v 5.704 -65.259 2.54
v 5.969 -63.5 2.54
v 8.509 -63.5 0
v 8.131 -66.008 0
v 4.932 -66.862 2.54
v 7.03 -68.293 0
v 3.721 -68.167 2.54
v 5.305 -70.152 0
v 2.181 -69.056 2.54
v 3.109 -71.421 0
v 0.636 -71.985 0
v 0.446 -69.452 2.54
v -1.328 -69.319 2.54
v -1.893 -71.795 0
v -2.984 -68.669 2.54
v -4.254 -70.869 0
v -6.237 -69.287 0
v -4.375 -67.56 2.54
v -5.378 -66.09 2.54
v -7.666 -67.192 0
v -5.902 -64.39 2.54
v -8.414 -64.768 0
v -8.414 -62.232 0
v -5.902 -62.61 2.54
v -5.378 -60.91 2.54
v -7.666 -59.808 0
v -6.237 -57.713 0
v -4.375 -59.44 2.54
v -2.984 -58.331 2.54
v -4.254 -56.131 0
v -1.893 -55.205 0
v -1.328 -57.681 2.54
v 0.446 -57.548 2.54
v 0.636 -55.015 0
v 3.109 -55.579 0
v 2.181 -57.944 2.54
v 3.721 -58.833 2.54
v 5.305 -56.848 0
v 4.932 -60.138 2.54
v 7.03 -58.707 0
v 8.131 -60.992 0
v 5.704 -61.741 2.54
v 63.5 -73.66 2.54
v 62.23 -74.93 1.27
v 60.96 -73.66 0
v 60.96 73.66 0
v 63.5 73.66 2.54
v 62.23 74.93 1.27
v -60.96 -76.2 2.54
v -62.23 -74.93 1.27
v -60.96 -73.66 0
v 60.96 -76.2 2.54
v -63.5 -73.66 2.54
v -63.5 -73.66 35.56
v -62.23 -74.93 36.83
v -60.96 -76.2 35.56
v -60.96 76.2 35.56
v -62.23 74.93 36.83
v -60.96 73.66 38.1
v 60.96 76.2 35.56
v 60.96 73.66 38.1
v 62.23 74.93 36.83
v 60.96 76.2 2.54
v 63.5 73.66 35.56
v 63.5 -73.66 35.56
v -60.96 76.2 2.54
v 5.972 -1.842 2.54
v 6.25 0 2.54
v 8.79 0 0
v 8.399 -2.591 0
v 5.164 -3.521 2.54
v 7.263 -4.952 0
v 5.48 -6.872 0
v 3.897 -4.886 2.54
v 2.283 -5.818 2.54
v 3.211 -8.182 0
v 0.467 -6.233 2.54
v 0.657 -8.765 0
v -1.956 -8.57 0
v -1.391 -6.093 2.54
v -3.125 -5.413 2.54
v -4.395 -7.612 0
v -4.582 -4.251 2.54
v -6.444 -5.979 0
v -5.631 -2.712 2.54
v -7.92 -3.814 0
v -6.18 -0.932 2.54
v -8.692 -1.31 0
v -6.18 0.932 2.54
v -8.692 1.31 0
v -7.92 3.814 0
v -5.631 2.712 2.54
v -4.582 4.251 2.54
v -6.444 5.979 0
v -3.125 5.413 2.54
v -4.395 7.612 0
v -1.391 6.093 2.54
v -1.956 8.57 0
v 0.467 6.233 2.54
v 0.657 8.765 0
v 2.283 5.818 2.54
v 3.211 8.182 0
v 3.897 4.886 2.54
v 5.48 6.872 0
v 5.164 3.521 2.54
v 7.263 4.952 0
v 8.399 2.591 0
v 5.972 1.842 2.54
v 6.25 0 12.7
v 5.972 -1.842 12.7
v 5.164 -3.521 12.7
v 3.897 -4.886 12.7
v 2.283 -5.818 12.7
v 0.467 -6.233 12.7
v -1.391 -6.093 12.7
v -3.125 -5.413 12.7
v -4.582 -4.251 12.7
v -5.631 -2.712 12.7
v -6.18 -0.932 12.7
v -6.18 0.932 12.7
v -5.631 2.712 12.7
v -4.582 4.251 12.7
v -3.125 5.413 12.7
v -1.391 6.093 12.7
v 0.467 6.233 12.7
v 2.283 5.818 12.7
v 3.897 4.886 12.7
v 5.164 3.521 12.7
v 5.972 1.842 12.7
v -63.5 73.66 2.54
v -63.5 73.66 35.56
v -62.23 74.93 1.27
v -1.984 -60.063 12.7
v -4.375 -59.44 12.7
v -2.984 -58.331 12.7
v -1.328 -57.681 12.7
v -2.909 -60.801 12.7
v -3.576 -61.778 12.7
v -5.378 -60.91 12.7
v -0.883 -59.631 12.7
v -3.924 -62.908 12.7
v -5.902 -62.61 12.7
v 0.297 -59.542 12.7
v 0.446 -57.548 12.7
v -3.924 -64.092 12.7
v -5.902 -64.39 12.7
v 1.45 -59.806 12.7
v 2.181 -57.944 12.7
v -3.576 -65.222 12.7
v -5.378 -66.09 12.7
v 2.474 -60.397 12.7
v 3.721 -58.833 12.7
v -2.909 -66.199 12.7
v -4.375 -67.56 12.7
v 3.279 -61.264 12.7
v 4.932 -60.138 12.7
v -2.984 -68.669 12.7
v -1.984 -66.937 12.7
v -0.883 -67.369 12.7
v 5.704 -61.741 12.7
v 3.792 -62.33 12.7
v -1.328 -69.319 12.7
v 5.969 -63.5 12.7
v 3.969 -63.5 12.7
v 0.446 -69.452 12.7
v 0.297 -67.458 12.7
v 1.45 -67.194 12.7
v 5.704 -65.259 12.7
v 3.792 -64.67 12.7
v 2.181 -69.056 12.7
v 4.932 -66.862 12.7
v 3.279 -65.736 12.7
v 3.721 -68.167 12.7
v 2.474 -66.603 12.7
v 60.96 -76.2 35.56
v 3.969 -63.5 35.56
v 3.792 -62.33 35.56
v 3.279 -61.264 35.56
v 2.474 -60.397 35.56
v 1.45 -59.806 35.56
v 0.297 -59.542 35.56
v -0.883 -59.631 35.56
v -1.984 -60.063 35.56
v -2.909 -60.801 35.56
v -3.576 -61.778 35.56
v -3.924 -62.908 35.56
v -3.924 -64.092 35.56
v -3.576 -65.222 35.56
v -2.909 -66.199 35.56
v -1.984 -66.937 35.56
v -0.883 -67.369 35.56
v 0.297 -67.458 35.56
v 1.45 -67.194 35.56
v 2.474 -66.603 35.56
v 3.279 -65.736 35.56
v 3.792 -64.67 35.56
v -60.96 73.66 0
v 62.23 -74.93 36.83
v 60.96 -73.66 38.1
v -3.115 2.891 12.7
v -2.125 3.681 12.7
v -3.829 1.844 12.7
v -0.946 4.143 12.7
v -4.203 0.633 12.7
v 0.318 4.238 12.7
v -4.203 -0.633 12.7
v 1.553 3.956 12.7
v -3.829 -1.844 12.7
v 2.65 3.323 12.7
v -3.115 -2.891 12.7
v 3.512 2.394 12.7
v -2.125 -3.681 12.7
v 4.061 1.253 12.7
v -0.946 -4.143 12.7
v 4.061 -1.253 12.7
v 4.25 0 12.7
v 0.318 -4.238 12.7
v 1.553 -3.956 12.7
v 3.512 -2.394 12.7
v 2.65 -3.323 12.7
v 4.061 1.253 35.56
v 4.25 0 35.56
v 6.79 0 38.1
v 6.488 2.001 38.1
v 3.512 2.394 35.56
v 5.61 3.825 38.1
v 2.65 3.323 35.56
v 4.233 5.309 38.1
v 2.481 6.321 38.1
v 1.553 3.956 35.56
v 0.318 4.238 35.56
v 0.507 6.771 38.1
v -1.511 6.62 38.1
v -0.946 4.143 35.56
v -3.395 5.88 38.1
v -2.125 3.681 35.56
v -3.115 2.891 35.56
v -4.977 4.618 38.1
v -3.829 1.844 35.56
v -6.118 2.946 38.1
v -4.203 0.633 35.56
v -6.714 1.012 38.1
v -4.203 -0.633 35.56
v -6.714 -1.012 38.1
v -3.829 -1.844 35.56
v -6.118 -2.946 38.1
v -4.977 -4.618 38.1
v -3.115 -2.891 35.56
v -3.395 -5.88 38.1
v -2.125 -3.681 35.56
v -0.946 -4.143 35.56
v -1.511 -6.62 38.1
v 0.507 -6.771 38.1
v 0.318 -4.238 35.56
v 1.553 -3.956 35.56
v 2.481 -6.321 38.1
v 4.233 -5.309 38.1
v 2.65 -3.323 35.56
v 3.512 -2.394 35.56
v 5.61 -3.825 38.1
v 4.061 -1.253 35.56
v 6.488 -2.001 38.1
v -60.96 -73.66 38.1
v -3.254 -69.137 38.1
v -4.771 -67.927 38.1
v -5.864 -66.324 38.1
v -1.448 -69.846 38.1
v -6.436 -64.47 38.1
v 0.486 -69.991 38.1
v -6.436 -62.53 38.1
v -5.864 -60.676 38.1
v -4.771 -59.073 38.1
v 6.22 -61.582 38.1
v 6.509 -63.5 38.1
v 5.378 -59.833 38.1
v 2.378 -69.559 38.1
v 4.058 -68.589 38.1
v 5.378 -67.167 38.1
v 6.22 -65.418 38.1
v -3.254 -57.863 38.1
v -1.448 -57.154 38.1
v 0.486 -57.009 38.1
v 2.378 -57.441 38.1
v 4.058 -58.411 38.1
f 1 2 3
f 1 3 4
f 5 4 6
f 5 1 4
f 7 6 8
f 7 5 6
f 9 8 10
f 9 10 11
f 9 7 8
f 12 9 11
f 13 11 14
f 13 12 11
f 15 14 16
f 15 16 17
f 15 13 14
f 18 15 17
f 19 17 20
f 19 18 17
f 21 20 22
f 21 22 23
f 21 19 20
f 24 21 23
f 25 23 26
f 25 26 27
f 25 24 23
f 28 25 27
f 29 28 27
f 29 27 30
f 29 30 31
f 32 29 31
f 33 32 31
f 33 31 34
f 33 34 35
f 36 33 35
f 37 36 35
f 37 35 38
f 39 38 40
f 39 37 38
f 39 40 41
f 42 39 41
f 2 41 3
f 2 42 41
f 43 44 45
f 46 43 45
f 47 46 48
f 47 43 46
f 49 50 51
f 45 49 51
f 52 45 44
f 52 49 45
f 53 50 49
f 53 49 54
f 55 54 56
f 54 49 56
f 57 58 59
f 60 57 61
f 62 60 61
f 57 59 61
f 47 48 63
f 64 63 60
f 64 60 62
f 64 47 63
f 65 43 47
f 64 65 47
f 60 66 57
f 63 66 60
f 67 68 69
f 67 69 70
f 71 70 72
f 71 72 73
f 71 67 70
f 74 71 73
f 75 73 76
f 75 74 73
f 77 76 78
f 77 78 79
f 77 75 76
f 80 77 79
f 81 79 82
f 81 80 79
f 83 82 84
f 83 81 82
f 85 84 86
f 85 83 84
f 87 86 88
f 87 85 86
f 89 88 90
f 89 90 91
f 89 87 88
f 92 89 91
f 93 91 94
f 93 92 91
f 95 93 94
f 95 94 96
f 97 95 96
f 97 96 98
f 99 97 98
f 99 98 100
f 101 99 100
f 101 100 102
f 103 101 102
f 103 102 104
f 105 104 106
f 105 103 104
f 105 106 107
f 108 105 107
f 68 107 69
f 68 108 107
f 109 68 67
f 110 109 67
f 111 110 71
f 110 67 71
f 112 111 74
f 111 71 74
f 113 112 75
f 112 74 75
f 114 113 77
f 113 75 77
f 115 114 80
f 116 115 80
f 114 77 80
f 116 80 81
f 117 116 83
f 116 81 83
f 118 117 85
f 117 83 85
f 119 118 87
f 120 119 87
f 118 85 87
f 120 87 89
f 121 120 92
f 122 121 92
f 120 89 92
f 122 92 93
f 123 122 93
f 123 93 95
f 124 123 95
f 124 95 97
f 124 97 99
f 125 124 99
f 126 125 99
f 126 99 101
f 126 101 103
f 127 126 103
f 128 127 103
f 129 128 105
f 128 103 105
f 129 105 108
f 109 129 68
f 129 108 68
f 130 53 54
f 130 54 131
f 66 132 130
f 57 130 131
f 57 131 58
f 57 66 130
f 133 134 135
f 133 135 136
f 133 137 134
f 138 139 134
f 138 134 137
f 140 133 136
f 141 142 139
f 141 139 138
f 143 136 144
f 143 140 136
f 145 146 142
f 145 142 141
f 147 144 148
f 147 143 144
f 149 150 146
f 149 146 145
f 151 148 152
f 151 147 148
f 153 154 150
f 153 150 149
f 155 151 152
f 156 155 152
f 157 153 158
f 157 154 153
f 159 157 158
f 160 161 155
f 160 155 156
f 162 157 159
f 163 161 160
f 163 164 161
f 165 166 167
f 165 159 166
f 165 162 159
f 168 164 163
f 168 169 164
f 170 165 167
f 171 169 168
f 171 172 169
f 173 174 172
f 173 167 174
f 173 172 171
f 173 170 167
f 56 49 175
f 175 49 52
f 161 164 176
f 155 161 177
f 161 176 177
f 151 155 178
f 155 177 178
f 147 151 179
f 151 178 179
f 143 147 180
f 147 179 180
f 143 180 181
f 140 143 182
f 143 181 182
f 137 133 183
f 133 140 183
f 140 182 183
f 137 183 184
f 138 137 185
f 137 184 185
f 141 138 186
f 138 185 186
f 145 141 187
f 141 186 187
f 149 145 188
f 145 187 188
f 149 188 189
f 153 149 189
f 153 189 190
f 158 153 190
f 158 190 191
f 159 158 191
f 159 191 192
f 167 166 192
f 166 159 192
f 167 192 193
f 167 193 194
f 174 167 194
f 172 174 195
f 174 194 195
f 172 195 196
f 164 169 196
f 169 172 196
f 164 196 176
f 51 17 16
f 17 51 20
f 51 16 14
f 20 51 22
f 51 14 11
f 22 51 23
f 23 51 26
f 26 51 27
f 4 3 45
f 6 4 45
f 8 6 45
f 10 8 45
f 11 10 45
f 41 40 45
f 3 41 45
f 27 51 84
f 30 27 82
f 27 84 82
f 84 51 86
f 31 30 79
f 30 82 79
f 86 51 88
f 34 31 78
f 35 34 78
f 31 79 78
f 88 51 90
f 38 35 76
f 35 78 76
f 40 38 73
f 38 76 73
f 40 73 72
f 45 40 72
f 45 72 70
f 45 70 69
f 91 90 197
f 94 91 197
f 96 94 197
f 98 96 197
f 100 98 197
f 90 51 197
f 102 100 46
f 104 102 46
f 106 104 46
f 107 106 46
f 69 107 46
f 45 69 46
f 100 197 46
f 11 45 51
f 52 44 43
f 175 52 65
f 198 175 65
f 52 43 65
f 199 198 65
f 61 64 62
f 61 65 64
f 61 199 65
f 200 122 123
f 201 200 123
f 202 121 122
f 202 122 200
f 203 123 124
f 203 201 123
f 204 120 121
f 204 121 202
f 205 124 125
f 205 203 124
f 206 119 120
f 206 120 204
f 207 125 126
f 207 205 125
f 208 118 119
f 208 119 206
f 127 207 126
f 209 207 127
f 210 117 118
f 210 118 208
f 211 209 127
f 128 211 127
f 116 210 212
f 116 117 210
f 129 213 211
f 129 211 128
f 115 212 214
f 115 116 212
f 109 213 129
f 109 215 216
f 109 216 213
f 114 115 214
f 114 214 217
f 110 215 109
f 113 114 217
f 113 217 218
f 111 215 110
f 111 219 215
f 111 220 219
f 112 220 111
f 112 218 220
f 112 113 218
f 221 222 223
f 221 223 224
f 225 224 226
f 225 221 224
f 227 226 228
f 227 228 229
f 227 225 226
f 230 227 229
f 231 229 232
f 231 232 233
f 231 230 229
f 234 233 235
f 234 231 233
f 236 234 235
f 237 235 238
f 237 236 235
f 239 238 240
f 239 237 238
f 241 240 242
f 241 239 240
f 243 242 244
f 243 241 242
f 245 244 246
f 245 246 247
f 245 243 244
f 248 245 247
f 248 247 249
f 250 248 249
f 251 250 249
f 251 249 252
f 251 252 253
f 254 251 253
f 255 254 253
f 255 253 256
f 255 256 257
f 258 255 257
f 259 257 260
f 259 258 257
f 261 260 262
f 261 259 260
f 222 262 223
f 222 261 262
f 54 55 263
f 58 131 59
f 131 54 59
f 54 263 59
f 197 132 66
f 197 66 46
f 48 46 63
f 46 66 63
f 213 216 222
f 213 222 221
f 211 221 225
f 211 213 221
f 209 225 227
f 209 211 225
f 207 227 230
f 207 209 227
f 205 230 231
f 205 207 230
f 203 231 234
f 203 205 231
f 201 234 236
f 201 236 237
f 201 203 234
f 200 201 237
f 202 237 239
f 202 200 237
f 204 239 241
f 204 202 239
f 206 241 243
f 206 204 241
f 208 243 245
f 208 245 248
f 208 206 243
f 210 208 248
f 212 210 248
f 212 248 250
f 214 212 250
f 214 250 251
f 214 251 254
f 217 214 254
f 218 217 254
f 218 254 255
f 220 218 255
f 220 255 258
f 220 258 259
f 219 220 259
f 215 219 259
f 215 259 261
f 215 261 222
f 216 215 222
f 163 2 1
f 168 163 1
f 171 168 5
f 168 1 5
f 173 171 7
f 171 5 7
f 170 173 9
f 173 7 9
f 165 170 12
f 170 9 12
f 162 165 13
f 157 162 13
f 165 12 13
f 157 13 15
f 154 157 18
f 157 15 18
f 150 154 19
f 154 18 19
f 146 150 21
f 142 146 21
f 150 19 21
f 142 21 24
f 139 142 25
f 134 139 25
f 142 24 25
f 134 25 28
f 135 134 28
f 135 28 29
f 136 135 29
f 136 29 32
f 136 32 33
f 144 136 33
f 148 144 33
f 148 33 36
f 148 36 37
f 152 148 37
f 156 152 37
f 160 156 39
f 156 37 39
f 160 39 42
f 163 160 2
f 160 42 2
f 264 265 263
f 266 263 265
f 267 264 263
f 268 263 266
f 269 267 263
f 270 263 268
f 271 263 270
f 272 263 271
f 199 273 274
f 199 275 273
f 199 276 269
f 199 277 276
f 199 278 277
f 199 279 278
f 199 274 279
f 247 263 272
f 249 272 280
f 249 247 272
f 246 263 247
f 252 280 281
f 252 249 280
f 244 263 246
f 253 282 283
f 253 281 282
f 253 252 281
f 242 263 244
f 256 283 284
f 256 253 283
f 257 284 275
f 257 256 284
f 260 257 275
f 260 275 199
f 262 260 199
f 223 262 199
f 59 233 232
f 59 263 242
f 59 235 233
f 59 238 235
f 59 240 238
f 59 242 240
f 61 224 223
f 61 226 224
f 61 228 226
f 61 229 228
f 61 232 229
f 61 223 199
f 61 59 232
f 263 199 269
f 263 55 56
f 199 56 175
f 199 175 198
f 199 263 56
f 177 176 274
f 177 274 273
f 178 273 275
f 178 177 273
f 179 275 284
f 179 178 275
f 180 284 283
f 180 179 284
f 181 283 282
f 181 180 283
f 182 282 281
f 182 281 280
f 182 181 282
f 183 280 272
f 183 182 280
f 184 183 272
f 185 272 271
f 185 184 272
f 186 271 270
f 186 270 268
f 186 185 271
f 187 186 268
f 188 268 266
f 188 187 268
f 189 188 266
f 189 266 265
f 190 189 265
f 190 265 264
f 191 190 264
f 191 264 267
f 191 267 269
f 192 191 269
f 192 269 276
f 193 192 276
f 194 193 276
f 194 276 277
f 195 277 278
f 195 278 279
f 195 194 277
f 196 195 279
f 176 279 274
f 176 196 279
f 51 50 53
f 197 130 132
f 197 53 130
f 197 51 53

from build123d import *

# Parameters (mm, degrees)
F0_W        = 127
F0_H        = 152.4
F0_R        = 4.25
F1_DEPTH    = 38.1
F3_R        = 3.96875
F4_DEPTH    = 50.8
F5_R        = 6.25
F5_R_2      = 4.25
F5_R_3      = 5.96875
F5_R_4      = 3.96875
F6_DEPTH    = 12.7
F7_C1_SIZE  = 2.54
F7_C2_SIZE  = 2.54
F7_C3_SIZE  = 2.54
F7_C4_SIZE  = 2.54
F7_C5_SIZE  = 2.54
F7_C6_SIZE  = 2.54
F7_C7_SIZE  = 2.54
F7_C8_SIZE  = 2.54
F7_C9_SIZE  = 2.54
F7_C10_SIZE = 2.54
F7_C11_SIZE = 2.54
F7_C12_SIZE = 2.54
F7_C13_SIZE = 2.54
F7_C14_SIZE = 2.54
F7_C15_SIZE = 2.54
F7_C16_SIZE = 2.54


# Not quite as in the source:
# - two fillets or chamfers of one size are made in one step
# - a feature names something its author has since deleted; it is built from what else it names


with BuildPart() as f1:
    # F0 (on Top) → F1 (new body)
    with BuildSketch(Plane.XY):
        Rectangle(F0_W, F0_H)
        Circle(F0_R, mode=Mode.SUBTRACT)
    extrude(amount=F1_DEPTH)

    # F3 (on face) → F4 (cut)
    with BuildSketch(Plane.XY.offset(38.1)):
        with Locations((0, -63.5)):
            Circle(F3_R)
    extrude(amount=-F4_DEPTH, mode=Mode.SUBTRACT)

    # F5 (on face) → F6 (cut)
    with BuildSketch(Plane(origin=(0, 0, 0), x_dir=(1, 0, 0), z_dir=(0, 0, -1))):
        Circle(F5_R)
        Circle(F5_R_2, mode=Mode.SUBTRACT)
        with Locations((0, 63.5)):
            Circle(F5_R_3)
        with Locations((0, 63.5)):
            Circle(F5_R_4, mode=Mode.SUBTRACT)
    extrude(amount=-F6_DEPTH, mode=Mode.SUBTRACT)

    # F7: chamfer of 2.54 on 16 edges, made by hand

    # F7_c1
    f7_c1_edges = [f1.edges().sort_by_distance(p)[0] for p in [
        (-63.5, -76.2, 19.05),
    ]]
    chamfer(f7_c1_edges, length=F7_C1_SIZE)

    # F7_c2
    f7_c2_edges = [f1.edges().sort_by_distance(p)[0] for p in [
        (63.5, -76.2, 19.05),
    ]]
    chamfer(f7_c2_edges, length=F7_C2_SIZE)

    # F7_c3
    f7_c3_edges = [f1.edges().sort_by_distance(p)[0] for p in [
        (0, -76.2, 0),
    ]]
    chamfer(f7_c3_edges, length=F7_C3_SIZE)

    # F7_c4
    f7_c4_edges = [f1.edges().sort_by_distance(p)[0] for p in [
        (0, -76.2, 38.1),
    ]]
    chamfer(f7_c4_edges, length=F7_C4_SIZE)

    # F7_c5
    f7_c5_edges = [f1.edges().sort_by_distance(p)[0] for p in [
        (-63.5, 76.2, 19.05),
    ]]
    chamfer(f7_c5_edges, length=F7_C5_SIZE)

    # F7_c6
    f7_c6_edges = [f1.edges().sort_by_distance(p)[0] for p in [
        (-63.5, 0, 0),
    ]]
    chamfer(f7_c6_edges, length=F7_C6_SIZE)

    # F7_c7
    f7_c7_edges = [f1.edges().sort_by_distance(p)[0] for p in [
        (-63.5, 0, 38.1),
    ]]
    chamfer(f7_c7_edges, length=F7_C7_SIZE)

    # F7_c8
    f7_c8_edges = [f1.edges().sort_by_distance(p)[0] for p in [
        (63.5, 76.2, 19.05),
    ]]
    chamfer(f7_c8_edges, length=F7_C8_SIZE)

    # F7_c9
    f7_c9_edges = [f1.edges().sort_by_distance(p)[0] for p in [
        (63.5, 0, 0),
    ]]
    chamfer(f7_c9_edges, length=F7_C9_SIZE)

    # F7_c10
    f7_c10_edges = [f1.edges().sort_by_distance(p)[0] for p in [
        (63.5, 0, 38.1),
    ]]
    chamfer(f7_c10_edges, length=F7_C10_SIZE)

    # F7_c11
    f7_c11_edges = [f1.edges().sort_by_distance(p)[0] for p in [
        (0, 76.2, 0),
    ]]
    chamfer(f7_c11_edges, length=F7_C11_SIZE)

    # F7_c12
    f7_c12_edges = [f1.edges().sort_by_distance(p)[0] for p in [
        (-5.96875, -63.5, 0),
    ]]
    chamfer(f7_c12_edges, length=F7_C12_SIZE)

    # F7_c13
    f7_c13_edges = [f1.edges().sort_by_distance(p)[0] for p in [
        (-6.25, 0, 0),
    ]]
    chamfer(f7_c13_edges, length=F7_C13_SIZE)

    # F7_c14
    f7_c14_edges = [f1.edges().sort_by_distance(p)[0] for p in [
        (0, 76.2, 38.1),
    ]]
    chamfer(f7_c14_edges, length=F7_C14_SIZE)

    # F7_c15
    f7_c15_edges = [f1.edges().sort_by_distance(p)[0] for p in [
        (-3.96875, -63.5, 38.1),
    ]]
    chamfer(f7_c15_edges, length=F7_C15_SIZE)

    # F7_c16
    f7_c16_edges = [f1.edges().sort_by_distance(p)[0] for p in [
        (-4.25, 0, 38.1),
    ]]
    chamfer(f7_c16_edges, length=F7_C16_SIZE)


solid = f1.part
